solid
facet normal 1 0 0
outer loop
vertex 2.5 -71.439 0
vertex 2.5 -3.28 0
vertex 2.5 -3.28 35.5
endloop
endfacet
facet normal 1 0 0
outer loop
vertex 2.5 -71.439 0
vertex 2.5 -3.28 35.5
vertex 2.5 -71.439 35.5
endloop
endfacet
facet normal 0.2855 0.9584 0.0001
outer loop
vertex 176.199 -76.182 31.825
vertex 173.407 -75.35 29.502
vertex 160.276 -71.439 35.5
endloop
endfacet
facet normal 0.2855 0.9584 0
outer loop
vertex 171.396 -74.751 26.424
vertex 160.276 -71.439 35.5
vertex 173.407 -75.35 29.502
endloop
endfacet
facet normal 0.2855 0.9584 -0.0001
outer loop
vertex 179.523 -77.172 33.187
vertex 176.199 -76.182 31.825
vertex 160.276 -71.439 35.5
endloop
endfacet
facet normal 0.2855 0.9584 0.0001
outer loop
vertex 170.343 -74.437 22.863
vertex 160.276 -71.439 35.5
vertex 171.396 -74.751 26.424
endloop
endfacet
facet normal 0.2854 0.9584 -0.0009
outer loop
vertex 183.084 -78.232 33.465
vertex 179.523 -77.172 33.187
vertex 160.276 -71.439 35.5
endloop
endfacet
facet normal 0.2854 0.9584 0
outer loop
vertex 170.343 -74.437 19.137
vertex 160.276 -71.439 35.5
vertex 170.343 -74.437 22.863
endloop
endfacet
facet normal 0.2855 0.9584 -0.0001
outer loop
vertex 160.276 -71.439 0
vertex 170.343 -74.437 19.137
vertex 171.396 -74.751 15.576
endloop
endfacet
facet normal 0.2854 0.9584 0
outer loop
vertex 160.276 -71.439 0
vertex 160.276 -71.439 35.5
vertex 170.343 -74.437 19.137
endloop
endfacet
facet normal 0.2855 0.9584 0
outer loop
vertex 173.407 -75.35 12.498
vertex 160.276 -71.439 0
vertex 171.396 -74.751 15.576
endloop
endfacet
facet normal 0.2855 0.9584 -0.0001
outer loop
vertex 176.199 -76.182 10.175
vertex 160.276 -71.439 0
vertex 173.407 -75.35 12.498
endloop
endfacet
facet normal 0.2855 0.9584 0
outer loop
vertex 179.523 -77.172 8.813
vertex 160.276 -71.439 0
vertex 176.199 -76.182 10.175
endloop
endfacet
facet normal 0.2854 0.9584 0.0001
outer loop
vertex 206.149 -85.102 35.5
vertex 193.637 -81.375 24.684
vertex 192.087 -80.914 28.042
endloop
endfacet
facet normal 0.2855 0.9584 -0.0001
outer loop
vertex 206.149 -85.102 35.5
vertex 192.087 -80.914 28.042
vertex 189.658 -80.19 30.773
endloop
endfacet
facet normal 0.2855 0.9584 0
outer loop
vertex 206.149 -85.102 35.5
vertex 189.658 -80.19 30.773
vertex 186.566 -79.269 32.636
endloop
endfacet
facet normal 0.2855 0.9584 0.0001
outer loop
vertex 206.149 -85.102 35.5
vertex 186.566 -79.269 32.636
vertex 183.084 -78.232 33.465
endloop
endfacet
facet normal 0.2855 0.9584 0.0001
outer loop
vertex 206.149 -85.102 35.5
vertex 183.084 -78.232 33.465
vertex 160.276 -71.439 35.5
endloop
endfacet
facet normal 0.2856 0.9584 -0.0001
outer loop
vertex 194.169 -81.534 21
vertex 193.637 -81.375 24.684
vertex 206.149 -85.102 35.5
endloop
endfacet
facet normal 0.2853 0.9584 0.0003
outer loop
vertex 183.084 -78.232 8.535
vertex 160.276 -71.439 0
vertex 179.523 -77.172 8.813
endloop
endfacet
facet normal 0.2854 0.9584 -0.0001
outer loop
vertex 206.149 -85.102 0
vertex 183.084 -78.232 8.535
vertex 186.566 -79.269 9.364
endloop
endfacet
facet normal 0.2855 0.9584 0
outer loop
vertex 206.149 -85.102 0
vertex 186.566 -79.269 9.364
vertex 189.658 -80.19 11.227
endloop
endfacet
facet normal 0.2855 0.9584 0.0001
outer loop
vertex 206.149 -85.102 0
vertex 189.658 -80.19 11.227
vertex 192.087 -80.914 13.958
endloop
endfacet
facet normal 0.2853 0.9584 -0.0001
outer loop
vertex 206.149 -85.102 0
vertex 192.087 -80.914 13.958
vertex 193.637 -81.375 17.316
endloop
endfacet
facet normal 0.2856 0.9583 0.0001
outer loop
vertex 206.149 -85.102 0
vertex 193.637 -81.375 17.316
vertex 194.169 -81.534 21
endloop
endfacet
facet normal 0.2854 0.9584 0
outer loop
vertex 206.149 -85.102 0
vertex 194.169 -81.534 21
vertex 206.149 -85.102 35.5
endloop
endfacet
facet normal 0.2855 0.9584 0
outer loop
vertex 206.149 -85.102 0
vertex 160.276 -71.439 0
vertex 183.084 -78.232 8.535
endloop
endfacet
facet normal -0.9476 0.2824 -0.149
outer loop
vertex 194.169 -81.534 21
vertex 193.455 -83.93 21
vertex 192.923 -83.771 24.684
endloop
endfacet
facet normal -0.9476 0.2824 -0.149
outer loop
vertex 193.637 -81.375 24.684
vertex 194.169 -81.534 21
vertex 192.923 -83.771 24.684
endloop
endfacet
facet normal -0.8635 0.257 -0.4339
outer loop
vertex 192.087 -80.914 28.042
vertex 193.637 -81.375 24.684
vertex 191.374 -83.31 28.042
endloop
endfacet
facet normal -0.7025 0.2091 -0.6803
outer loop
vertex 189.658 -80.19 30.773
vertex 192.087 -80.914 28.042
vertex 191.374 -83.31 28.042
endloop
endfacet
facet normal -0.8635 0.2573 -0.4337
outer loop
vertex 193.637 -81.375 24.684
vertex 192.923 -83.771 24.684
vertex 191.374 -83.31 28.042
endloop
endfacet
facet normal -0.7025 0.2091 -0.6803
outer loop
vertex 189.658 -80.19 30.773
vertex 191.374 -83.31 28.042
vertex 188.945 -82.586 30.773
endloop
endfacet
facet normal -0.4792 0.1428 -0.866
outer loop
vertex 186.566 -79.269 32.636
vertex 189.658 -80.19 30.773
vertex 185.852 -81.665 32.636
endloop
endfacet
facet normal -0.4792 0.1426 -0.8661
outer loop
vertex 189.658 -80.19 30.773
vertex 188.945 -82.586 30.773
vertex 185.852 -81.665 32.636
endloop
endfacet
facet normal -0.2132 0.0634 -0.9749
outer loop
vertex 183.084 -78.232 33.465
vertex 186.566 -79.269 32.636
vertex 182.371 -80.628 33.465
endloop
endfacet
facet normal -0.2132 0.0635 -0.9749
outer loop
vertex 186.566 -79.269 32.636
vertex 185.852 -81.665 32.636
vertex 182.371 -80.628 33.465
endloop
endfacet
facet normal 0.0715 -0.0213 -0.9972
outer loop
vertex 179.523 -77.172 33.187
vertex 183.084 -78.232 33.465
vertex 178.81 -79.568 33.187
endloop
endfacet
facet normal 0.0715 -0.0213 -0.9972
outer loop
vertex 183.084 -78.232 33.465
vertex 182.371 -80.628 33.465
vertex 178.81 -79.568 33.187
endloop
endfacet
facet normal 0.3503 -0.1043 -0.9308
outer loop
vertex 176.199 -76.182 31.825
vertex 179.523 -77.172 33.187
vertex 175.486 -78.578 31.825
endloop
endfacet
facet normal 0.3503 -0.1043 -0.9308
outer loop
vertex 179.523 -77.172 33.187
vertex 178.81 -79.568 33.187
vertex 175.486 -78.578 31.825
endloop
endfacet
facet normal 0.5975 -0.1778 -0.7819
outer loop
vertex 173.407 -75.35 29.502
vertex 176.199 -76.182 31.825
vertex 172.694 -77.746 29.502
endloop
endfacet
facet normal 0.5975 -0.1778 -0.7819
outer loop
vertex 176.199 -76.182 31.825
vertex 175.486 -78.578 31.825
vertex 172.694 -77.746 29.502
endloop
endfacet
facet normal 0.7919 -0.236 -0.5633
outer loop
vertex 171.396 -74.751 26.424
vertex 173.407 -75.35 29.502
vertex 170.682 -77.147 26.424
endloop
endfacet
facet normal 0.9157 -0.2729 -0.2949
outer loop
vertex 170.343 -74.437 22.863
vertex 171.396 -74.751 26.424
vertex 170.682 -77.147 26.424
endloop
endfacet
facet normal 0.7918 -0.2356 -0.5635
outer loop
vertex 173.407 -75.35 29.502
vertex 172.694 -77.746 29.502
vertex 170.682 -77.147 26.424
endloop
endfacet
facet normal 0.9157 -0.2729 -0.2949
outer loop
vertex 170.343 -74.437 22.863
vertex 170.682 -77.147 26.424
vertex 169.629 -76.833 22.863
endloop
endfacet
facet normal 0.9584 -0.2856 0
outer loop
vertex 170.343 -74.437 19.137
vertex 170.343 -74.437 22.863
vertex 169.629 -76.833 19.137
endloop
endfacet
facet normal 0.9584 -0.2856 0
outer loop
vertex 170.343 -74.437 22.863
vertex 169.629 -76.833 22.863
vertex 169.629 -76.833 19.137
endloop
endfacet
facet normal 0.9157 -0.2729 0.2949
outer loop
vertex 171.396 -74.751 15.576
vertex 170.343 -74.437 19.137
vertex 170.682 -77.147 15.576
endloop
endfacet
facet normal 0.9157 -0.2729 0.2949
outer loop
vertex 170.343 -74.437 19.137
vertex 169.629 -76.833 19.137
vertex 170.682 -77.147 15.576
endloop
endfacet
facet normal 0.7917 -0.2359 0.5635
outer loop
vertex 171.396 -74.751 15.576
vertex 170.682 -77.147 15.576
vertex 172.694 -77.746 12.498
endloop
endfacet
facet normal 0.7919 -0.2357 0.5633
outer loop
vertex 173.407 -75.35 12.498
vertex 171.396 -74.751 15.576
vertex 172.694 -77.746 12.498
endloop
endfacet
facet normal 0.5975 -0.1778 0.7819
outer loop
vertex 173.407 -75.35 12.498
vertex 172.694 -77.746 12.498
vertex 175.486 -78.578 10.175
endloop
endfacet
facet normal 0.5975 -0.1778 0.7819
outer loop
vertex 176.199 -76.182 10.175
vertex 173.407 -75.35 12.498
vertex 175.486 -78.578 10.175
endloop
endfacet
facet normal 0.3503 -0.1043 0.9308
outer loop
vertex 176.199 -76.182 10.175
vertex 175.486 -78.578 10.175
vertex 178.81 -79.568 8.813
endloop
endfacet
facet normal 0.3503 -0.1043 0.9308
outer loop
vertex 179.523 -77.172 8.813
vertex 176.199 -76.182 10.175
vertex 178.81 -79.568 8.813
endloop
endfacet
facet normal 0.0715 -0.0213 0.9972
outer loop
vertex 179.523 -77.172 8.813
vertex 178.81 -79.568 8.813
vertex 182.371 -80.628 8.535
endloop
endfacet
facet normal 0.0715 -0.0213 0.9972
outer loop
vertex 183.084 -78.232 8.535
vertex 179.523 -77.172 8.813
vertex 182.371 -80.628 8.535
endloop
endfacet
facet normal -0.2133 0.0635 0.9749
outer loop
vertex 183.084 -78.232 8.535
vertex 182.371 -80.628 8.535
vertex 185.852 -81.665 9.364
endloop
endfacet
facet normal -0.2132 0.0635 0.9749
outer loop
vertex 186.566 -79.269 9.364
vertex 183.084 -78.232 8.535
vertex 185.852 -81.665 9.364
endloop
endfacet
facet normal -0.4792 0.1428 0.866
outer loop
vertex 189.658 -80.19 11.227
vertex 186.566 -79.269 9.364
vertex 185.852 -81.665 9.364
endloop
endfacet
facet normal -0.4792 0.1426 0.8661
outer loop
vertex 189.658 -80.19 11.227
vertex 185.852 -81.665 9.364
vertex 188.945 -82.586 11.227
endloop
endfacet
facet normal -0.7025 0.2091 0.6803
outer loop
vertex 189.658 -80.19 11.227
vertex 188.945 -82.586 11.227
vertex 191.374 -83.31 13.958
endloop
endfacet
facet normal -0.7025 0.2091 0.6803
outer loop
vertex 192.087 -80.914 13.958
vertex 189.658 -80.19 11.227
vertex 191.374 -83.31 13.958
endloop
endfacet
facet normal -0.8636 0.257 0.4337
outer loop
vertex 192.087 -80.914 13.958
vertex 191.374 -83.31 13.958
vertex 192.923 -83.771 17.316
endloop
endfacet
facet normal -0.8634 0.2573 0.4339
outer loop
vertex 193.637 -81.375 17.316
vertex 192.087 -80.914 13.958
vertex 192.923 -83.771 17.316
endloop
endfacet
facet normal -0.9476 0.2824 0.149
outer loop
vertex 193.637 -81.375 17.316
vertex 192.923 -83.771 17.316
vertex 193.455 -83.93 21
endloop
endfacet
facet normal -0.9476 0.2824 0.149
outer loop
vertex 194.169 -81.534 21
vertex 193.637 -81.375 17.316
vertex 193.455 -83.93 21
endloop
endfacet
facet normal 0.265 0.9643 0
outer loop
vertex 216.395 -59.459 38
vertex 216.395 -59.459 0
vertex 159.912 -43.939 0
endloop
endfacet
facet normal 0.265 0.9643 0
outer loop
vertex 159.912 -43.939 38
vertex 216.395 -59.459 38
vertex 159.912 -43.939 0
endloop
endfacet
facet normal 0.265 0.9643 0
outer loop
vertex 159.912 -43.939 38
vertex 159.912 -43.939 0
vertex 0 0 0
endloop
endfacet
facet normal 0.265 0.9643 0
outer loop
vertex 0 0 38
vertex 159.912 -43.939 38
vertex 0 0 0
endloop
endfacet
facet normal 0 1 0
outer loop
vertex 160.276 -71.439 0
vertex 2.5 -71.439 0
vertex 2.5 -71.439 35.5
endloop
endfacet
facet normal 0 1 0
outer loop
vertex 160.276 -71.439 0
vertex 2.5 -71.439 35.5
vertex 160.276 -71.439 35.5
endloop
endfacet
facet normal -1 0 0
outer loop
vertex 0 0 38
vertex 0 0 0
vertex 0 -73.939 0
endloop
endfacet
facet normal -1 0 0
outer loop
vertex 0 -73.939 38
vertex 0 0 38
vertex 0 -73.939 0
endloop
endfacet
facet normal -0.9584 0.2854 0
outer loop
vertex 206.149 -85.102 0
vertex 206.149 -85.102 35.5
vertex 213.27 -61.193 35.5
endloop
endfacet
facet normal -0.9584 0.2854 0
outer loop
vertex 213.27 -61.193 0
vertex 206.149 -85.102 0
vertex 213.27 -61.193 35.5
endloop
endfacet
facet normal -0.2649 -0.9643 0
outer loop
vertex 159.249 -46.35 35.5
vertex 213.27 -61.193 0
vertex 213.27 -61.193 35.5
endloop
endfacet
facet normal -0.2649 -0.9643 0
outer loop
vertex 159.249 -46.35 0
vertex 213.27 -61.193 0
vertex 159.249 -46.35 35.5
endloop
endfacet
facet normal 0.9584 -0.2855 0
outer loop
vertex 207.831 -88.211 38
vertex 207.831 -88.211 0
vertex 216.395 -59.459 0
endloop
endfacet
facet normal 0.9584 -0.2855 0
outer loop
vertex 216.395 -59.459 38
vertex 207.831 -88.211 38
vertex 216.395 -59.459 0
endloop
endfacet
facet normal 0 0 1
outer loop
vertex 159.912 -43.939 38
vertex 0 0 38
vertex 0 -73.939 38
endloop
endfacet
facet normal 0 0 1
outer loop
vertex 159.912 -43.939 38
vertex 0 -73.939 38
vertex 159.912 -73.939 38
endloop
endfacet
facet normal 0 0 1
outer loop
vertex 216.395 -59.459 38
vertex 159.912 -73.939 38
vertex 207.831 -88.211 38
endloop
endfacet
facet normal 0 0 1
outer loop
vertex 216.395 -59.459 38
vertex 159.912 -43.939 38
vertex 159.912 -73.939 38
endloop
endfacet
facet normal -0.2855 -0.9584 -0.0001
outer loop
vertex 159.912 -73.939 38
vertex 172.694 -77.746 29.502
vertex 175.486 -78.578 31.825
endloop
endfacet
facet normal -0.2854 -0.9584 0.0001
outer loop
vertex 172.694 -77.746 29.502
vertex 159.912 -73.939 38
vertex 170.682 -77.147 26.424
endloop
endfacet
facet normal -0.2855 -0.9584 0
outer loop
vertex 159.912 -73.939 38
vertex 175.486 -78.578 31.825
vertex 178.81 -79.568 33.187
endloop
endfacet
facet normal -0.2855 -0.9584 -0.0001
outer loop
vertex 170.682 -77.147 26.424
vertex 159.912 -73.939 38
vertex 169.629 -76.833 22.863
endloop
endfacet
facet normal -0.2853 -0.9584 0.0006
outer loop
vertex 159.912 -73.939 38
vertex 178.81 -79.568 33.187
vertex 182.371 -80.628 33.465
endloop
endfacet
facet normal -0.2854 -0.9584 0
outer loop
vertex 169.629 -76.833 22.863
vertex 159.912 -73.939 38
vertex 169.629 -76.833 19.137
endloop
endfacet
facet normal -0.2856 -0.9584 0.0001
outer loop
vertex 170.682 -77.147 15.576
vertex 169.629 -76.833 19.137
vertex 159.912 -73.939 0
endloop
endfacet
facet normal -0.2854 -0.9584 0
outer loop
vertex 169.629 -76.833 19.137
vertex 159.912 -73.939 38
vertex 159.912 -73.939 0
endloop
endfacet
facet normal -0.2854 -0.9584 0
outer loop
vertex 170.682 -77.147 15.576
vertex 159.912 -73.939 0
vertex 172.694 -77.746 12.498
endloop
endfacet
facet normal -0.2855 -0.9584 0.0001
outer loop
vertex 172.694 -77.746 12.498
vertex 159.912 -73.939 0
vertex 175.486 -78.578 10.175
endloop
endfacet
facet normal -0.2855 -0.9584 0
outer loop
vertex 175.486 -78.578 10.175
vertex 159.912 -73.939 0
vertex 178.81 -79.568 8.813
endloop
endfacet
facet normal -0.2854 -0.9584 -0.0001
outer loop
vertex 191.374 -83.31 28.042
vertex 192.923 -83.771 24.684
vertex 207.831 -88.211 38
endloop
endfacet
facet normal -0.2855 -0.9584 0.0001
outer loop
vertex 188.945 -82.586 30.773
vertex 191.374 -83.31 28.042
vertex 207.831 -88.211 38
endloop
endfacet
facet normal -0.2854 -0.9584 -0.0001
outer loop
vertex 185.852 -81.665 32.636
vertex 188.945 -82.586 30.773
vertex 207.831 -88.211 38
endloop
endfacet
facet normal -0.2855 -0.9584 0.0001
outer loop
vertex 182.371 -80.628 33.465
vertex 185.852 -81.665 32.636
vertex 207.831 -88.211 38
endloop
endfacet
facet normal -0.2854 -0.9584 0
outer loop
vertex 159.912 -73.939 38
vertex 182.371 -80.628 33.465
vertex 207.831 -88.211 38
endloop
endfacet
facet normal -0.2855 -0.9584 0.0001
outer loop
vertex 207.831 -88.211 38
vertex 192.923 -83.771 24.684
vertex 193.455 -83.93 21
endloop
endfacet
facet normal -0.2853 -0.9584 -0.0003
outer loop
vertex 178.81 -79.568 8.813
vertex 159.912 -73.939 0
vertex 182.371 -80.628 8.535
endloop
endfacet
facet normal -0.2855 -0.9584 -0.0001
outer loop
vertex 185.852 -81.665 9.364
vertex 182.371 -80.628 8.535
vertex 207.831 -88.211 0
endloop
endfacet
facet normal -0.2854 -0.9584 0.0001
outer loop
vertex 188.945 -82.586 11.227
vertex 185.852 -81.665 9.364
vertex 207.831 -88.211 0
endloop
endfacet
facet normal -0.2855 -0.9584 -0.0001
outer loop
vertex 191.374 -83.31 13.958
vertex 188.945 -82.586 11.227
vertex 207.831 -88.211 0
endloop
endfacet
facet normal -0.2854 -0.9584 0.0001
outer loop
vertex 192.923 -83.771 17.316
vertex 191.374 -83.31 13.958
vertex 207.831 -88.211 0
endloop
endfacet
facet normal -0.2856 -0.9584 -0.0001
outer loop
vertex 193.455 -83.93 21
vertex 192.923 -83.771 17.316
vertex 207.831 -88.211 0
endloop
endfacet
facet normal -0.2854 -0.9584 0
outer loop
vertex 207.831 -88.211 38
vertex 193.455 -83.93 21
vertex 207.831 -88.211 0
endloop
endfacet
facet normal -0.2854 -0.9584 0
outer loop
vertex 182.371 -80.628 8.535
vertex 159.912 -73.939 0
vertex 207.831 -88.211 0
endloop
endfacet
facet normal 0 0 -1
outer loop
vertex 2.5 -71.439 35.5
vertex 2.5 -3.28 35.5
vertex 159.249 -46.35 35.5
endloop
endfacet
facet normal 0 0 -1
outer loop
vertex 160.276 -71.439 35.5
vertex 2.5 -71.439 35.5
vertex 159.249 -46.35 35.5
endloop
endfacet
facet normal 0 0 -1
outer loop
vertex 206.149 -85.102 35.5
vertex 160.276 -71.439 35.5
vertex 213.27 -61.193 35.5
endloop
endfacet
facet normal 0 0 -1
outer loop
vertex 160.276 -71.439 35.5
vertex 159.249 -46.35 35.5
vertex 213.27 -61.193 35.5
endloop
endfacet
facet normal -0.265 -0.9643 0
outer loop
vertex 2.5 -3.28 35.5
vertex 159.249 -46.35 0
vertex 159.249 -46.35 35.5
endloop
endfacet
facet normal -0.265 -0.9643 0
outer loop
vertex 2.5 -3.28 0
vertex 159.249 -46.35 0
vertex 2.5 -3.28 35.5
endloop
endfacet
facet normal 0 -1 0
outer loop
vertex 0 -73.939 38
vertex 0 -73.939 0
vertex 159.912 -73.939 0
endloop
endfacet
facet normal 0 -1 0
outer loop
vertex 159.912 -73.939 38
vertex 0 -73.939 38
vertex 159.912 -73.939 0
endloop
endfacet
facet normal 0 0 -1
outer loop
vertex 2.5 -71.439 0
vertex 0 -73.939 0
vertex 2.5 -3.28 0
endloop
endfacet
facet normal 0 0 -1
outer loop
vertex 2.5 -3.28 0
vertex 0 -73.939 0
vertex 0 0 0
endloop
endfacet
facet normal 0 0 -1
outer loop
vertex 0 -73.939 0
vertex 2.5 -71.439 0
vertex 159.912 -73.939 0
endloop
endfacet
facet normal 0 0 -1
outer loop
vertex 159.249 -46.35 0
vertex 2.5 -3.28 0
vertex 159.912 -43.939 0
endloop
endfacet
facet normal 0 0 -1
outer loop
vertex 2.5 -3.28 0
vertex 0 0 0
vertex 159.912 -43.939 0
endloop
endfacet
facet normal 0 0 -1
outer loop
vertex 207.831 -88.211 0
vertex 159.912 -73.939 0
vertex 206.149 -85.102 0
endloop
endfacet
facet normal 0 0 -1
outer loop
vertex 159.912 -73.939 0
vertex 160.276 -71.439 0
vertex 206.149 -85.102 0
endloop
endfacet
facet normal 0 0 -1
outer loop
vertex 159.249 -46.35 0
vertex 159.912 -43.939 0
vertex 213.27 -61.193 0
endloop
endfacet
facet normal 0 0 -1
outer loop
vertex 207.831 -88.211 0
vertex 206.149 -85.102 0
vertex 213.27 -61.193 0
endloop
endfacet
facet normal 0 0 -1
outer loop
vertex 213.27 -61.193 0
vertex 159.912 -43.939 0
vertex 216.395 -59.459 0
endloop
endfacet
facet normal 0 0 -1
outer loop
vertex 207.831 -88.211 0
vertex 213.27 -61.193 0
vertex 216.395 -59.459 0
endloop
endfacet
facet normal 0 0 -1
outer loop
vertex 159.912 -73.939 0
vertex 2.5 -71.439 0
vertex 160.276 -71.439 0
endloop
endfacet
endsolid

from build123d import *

# Parameters (mm, degrees)
F1_DEPTH = 38
F2_T     = -2.5
F3_R     = 12.5
F4_DEPTH = 5


with BuildPart() as f1:
    # F0 (on Top) → F1 (new body)
    with BuildSketch(Plane.XY):
        Polygon((216.3945465859, -59.4591971258), (159.9115557721, -43.9392436979), (0, 0), (0, -73.9392436979), (159.9115557721, -73.9392436979), (207.8314225052, -88.2111171656), align=None)
    extrude(amount=F1_DEPTH)

    # F2
    f2_openings = [f1.faces().sort_by_distance(p)[0] for p in [
        (87.639416, -49.571978, 0),
    ]]
    offset(amount=F2_T, openings=f2_openings, kind=Kind.INTERSECTION)

    # F3 (on face) → F4 (cut)
    with BuildSketch(Plane(origin=(-7.1982832096, -24.1692706211, 0), x_dir=(0.9583973347, -0.2854374694, 0), z_dir=(-0.2854374694, -0.9583973347, 0))):
        with Locations((196.8638394408, 21)):
            Circle(F3_R)
    extrude(amount=-F4_DEPTH, mode=Mode.SUBTRACT)


solid = f1.part
